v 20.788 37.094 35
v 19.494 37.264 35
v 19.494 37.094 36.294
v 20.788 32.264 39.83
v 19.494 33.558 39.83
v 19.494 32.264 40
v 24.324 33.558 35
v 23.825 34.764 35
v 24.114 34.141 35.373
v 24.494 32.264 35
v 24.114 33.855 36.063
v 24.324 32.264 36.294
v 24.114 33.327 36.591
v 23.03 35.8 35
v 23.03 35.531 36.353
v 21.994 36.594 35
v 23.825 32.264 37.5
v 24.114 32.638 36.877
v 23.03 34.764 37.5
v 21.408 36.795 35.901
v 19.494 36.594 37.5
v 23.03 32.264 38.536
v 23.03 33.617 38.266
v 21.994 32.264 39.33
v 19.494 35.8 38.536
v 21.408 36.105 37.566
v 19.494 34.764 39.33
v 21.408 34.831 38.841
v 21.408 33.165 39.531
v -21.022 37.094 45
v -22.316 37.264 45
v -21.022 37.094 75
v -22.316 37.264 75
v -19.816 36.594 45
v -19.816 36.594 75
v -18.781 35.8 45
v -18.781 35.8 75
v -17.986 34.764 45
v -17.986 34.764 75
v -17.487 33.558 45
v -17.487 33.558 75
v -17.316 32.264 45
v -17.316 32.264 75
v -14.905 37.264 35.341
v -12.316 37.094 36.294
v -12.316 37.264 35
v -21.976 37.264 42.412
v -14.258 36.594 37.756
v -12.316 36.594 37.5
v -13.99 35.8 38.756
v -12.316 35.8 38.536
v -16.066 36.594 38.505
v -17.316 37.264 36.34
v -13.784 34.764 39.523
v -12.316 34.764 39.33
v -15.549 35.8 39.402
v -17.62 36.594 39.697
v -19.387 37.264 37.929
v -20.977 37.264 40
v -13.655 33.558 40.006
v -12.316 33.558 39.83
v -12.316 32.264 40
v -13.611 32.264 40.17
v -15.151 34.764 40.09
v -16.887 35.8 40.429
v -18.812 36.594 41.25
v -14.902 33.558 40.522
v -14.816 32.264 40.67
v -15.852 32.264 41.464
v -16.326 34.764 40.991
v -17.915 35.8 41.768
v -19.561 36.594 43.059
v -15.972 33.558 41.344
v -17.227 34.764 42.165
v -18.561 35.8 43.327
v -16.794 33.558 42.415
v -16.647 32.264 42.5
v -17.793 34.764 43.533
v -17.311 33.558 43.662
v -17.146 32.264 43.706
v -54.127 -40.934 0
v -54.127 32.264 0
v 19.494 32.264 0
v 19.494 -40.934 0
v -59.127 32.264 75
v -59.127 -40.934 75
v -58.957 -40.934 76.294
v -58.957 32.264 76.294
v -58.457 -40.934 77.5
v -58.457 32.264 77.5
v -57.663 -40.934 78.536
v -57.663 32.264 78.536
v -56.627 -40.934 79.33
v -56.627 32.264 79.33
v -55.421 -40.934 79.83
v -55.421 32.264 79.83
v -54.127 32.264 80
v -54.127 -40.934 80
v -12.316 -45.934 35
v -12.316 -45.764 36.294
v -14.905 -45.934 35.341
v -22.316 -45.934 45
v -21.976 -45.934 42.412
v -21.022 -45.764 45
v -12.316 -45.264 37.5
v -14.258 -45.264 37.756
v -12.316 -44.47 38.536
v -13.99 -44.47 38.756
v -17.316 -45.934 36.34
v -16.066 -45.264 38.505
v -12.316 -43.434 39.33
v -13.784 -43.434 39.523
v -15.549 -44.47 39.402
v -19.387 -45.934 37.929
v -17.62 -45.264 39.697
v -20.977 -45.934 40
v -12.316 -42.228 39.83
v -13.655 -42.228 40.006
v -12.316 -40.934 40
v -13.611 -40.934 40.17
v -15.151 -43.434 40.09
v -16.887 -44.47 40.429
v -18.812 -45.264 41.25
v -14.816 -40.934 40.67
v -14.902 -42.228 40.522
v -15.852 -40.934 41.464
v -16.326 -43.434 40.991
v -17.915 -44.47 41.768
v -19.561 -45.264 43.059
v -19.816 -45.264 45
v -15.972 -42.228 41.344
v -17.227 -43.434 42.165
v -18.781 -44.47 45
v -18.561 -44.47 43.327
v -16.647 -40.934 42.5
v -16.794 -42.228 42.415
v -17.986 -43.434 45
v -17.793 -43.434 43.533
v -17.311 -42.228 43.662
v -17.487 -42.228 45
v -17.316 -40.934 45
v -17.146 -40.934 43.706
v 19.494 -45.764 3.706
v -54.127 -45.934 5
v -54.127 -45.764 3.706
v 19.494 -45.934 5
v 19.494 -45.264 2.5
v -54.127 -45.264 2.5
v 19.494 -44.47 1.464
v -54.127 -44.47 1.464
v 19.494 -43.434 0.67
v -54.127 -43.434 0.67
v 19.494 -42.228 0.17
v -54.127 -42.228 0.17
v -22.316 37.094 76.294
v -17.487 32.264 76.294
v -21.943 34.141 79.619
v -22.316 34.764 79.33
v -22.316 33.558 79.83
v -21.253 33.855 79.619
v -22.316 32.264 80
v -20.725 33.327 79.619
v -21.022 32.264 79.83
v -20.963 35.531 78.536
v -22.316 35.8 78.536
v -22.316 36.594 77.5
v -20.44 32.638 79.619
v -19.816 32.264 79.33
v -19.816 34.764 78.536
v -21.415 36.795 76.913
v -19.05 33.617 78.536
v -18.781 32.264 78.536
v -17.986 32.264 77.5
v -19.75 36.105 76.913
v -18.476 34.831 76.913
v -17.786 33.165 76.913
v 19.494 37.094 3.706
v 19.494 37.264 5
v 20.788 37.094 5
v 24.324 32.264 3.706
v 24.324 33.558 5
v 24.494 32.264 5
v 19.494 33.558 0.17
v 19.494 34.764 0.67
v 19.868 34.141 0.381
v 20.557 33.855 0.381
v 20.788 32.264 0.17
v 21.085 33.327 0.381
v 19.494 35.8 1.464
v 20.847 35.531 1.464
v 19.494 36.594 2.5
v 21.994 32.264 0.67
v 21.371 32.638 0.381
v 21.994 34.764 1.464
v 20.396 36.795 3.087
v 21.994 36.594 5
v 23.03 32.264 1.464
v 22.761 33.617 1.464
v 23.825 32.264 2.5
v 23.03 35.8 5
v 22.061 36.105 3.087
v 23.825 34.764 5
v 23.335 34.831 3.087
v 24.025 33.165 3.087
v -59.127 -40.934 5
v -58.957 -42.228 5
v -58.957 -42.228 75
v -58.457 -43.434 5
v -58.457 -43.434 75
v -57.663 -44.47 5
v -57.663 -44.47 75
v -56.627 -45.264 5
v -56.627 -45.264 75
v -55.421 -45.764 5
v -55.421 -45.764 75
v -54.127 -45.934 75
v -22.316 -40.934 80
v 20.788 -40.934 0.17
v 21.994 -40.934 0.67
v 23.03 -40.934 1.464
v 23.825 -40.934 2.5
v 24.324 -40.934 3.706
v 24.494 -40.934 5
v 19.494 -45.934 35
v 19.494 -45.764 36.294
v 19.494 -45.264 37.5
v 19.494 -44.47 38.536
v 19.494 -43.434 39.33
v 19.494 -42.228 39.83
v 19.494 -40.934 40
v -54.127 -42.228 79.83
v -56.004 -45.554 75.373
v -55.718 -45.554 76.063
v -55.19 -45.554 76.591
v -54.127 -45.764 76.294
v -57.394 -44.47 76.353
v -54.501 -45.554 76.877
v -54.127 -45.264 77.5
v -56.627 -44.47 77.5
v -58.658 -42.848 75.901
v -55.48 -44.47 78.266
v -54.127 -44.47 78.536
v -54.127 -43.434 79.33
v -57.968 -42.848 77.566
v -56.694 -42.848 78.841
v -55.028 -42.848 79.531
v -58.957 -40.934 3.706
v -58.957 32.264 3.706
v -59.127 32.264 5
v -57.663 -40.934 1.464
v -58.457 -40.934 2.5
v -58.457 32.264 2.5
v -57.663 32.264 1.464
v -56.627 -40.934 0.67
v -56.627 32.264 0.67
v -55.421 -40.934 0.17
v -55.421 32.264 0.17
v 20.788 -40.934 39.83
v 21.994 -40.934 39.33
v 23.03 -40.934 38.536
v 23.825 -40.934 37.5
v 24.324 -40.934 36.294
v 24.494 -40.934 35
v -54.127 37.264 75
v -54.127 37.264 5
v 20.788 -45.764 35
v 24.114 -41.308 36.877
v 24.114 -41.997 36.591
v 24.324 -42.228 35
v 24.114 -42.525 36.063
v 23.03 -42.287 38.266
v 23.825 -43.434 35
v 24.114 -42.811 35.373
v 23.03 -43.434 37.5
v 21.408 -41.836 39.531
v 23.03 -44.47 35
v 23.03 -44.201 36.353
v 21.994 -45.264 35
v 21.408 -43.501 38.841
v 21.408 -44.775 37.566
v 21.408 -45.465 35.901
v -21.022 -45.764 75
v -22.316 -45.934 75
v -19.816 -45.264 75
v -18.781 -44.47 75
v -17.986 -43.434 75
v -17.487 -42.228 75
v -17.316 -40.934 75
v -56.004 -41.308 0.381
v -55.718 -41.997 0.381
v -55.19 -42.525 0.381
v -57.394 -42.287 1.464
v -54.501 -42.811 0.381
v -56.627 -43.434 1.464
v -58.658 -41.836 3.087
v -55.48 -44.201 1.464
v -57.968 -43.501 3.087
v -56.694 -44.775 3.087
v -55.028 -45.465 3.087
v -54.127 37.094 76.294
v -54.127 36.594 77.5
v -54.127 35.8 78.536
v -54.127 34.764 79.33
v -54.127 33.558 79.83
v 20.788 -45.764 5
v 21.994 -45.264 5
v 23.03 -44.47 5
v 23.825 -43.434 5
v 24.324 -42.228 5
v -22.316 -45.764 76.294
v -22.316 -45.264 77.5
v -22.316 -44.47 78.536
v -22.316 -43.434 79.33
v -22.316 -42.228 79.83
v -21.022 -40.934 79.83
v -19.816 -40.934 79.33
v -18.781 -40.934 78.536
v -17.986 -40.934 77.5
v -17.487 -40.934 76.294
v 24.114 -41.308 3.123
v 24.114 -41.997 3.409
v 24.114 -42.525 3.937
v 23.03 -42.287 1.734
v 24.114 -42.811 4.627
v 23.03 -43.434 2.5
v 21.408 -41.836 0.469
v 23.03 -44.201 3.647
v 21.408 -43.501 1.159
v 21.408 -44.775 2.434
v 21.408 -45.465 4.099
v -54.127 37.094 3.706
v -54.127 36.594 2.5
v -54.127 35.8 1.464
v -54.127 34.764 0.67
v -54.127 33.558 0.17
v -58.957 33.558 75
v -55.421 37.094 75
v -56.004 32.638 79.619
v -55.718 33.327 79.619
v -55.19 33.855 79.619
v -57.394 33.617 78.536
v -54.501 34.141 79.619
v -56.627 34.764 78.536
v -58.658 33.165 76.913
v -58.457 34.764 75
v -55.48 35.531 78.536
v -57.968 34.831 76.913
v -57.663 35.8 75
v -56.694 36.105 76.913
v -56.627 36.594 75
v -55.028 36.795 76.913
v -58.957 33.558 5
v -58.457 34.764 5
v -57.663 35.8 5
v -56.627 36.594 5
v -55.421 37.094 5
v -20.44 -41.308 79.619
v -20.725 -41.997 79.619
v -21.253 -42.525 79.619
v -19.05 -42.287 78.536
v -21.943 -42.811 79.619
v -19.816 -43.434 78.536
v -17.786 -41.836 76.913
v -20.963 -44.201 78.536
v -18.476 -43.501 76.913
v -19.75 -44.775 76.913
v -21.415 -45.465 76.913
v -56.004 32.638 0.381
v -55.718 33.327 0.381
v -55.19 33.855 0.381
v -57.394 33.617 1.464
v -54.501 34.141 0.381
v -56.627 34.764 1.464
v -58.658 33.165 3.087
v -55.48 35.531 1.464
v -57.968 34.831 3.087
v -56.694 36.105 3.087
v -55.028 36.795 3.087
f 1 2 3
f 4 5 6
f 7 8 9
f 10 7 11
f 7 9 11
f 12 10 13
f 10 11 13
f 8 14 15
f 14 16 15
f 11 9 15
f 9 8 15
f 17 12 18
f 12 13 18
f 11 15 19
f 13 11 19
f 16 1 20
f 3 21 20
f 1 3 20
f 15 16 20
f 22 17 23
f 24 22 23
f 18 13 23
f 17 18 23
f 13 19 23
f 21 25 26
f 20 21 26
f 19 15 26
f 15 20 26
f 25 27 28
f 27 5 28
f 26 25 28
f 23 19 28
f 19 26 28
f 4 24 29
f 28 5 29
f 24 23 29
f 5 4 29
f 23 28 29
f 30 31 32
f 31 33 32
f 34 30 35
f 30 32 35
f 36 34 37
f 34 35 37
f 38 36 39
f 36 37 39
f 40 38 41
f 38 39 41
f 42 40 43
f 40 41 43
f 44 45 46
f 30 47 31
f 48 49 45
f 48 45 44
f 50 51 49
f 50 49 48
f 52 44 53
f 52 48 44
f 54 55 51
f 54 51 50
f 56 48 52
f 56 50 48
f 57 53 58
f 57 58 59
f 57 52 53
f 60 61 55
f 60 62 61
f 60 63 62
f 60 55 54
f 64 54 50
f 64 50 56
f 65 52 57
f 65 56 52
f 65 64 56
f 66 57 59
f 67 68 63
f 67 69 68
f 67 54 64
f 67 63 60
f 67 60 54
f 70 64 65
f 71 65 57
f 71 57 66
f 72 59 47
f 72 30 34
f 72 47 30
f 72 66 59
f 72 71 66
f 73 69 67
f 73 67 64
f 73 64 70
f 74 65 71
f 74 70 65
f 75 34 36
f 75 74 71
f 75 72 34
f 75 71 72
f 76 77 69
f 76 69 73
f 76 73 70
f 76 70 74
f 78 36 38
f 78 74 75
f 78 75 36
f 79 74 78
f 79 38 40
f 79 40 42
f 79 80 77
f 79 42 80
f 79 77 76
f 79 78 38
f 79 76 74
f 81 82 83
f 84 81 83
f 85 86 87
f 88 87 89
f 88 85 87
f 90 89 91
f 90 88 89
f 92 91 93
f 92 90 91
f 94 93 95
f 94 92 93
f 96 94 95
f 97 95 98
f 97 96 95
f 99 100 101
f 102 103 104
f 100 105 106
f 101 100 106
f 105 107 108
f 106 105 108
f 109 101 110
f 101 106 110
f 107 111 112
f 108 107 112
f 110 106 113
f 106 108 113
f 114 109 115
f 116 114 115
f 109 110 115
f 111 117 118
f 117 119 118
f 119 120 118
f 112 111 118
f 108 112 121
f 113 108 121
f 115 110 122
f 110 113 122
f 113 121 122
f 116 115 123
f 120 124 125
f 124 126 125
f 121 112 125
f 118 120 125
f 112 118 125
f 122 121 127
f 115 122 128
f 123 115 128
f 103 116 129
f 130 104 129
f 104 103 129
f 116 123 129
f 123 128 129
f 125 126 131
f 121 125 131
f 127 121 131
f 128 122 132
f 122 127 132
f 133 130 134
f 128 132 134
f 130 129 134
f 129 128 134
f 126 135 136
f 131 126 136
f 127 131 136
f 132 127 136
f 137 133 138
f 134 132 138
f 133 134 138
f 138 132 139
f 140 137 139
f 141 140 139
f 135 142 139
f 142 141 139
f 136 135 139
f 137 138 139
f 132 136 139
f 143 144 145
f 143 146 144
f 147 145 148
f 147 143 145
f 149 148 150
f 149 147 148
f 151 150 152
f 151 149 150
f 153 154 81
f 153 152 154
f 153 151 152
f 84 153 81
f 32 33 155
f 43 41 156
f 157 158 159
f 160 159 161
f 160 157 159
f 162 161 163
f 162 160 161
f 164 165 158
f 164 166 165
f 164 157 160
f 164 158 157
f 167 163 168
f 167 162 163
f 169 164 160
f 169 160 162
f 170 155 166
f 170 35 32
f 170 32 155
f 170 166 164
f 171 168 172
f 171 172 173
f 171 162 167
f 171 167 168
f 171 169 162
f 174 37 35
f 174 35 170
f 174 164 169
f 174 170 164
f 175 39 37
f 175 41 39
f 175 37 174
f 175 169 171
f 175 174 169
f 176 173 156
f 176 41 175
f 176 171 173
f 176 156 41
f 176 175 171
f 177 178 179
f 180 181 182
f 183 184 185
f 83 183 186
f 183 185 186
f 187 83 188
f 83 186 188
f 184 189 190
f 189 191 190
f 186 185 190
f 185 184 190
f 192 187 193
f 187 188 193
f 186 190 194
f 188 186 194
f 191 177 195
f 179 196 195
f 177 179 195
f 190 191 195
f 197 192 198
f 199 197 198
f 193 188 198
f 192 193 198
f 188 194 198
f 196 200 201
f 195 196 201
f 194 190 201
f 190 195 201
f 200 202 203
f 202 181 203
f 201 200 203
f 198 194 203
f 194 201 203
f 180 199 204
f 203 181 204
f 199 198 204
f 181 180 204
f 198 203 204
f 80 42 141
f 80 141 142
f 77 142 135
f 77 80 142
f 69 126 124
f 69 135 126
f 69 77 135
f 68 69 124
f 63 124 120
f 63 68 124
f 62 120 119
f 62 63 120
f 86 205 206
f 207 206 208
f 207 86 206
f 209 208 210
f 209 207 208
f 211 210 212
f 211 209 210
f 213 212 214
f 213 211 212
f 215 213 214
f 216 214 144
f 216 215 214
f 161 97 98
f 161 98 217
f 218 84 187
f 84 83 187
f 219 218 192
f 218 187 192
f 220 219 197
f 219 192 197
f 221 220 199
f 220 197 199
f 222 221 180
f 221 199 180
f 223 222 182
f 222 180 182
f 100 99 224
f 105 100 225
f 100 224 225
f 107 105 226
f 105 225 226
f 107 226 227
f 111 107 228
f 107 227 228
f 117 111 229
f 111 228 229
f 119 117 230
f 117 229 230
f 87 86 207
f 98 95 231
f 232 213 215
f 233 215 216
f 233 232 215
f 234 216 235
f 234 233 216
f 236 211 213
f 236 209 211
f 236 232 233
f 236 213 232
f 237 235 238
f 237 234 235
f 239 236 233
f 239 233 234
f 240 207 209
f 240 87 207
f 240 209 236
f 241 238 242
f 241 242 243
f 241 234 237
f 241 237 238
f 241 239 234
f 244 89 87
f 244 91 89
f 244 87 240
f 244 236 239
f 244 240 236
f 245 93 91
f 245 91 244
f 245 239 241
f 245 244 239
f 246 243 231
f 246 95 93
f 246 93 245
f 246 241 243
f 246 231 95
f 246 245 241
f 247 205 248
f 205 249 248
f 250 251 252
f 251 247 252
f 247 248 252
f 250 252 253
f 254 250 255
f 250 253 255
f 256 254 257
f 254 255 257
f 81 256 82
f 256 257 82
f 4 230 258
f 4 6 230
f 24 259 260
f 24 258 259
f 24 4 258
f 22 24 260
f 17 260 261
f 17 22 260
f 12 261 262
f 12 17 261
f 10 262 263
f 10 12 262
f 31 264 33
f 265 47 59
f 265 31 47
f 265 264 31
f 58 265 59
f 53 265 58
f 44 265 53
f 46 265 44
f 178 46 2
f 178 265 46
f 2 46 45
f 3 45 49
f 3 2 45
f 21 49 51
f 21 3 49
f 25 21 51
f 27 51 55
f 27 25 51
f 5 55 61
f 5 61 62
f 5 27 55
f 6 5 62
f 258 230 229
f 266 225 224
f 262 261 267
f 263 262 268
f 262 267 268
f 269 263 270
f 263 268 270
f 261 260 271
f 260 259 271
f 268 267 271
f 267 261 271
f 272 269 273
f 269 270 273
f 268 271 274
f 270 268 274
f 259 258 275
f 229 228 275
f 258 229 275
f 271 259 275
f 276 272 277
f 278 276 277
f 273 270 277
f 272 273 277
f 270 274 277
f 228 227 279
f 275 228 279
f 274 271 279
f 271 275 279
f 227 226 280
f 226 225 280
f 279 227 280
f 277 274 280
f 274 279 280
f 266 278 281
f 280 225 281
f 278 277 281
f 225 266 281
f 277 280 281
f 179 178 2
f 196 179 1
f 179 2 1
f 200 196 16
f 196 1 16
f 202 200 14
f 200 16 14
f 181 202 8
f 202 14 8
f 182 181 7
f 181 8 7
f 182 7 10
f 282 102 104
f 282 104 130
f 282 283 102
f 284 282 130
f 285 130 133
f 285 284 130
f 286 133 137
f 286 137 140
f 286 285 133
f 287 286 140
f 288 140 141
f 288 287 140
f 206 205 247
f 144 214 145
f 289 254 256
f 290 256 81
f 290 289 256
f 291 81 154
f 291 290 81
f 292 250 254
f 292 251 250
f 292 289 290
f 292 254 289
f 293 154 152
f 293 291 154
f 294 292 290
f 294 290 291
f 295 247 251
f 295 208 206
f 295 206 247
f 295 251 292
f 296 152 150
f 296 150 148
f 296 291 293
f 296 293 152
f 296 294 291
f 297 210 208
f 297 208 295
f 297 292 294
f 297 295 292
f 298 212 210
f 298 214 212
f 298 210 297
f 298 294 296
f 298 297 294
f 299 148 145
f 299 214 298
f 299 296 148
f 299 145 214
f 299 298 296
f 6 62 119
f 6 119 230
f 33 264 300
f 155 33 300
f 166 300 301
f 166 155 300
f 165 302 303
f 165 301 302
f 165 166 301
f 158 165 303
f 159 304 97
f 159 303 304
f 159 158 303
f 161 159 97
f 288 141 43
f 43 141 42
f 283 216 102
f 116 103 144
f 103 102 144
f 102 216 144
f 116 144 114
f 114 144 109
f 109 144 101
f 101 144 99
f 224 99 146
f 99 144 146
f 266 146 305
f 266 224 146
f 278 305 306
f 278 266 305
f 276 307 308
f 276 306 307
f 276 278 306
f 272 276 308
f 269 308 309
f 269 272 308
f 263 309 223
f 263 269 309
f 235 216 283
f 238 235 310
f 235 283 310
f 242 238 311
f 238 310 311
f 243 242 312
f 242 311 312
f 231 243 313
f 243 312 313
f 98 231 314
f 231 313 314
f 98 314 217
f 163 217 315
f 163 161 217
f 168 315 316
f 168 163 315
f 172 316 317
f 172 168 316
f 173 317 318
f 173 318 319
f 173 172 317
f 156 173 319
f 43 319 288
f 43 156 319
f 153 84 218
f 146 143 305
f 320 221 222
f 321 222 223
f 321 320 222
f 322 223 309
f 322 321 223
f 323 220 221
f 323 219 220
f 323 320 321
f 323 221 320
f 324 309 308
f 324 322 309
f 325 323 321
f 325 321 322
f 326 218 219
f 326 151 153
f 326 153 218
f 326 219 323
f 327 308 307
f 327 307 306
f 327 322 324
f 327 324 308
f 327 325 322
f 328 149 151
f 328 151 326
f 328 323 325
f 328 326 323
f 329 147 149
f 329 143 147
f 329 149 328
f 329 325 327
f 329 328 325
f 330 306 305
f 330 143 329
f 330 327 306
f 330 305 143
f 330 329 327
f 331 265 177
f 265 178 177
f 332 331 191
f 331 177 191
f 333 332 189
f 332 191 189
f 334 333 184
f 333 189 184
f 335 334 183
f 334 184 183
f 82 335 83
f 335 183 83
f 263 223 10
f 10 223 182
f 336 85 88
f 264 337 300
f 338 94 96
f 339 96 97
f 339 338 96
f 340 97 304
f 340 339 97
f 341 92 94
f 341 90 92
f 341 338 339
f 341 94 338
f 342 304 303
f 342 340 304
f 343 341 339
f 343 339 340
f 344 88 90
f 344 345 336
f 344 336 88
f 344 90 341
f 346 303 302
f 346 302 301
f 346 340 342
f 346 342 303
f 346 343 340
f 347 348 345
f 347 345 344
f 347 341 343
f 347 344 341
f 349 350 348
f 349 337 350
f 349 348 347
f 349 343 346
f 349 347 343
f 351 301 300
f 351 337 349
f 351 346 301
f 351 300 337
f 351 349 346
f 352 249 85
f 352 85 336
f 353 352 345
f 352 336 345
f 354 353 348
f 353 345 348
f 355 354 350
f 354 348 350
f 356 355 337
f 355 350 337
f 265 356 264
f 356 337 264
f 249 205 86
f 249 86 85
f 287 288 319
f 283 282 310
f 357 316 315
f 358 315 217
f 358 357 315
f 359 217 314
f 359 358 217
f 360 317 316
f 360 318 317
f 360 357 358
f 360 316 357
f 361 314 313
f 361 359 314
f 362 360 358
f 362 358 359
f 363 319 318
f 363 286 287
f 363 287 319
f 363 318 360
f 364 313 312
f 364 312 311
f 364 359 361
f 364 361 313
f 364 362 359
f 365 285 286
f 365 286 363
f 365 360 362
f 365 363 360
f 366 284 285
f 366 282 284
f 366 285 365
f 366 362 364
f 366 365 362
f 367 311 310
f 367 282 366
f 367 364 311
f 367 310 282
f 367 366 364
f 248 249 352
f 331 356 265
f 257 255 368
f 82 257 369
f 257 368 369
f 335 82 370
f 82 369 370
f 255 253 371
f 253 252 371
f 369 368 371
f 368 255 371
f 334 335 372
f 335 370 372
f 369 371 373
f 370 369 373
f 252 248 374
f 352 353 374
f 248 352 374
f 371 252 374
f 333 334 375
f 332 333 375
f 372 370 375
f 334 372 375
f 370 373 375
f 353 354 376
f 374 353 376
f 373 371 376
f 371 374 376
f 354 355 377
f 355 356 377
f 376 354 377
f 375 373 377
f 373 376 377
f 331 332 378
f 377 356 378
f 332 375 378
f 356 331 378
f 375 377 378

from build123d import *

# Parameters (mm, degrees)
F0_W     = 83.6216490716
F0_H     = 83.1985995173
F1_DEPTH = 40
F2_W     = 41.8108245358
F2_H     = 83.1985995173
F3_DEPTH = 40
F4_R     = 5


with BuildPart() as f1:
    # F0 (on Top) → F1 (new body)
    with BuildSketch(Plane.XY):
        with Locations((-17.3164242879, -4.335001111)):
            Rectangle(F0_W, F0_H)
    extrude(amount=F1_DEPTH)

    # F2 (on face) → F3 (join)
    with BuildSketch(Plane.XY.offset(40)):
        with Locations((-38.2218365557, -4.335001111)):
            Rectangle(F2_W, F2_H)
    extrude(amount=F3_DEPTH)

    # F4
    f4_edges = [f1.edges().sort_by_distance(p)[0] for p in [
        (-17.316424, -4.335001, 40),
        (-59.127249, 37.264299, 40),
        (-59.127249, -4.335001, 80),
        (-59.127249, -45.934301, 40),
        (-59.127249, -4.335001, 0),
        (3.588988, 37.264299, 40),
        (3.588988, -45.934301, 40),
        (24.4944, 37.264299, 20),
        (-17.316424, 37.264299, 60),
        (-38.221837, 37.264299, 80),
        (-17.316424, 37.264299, 0),
        (-17.316424, -45.934301, 60),
        (-17.316424, -45.934301, 0),
        (24.4944, -4.335001, 0),
        (24.4944, -4.335001, 40),
        (-17.316424, -4.335001, 80),
        (-38.221837, -45.934301, 80),
        (24.4944, -45.934301, 20),
    ]]
    fillet(f4_edges, radius=F4_R)


solid = f1.part
